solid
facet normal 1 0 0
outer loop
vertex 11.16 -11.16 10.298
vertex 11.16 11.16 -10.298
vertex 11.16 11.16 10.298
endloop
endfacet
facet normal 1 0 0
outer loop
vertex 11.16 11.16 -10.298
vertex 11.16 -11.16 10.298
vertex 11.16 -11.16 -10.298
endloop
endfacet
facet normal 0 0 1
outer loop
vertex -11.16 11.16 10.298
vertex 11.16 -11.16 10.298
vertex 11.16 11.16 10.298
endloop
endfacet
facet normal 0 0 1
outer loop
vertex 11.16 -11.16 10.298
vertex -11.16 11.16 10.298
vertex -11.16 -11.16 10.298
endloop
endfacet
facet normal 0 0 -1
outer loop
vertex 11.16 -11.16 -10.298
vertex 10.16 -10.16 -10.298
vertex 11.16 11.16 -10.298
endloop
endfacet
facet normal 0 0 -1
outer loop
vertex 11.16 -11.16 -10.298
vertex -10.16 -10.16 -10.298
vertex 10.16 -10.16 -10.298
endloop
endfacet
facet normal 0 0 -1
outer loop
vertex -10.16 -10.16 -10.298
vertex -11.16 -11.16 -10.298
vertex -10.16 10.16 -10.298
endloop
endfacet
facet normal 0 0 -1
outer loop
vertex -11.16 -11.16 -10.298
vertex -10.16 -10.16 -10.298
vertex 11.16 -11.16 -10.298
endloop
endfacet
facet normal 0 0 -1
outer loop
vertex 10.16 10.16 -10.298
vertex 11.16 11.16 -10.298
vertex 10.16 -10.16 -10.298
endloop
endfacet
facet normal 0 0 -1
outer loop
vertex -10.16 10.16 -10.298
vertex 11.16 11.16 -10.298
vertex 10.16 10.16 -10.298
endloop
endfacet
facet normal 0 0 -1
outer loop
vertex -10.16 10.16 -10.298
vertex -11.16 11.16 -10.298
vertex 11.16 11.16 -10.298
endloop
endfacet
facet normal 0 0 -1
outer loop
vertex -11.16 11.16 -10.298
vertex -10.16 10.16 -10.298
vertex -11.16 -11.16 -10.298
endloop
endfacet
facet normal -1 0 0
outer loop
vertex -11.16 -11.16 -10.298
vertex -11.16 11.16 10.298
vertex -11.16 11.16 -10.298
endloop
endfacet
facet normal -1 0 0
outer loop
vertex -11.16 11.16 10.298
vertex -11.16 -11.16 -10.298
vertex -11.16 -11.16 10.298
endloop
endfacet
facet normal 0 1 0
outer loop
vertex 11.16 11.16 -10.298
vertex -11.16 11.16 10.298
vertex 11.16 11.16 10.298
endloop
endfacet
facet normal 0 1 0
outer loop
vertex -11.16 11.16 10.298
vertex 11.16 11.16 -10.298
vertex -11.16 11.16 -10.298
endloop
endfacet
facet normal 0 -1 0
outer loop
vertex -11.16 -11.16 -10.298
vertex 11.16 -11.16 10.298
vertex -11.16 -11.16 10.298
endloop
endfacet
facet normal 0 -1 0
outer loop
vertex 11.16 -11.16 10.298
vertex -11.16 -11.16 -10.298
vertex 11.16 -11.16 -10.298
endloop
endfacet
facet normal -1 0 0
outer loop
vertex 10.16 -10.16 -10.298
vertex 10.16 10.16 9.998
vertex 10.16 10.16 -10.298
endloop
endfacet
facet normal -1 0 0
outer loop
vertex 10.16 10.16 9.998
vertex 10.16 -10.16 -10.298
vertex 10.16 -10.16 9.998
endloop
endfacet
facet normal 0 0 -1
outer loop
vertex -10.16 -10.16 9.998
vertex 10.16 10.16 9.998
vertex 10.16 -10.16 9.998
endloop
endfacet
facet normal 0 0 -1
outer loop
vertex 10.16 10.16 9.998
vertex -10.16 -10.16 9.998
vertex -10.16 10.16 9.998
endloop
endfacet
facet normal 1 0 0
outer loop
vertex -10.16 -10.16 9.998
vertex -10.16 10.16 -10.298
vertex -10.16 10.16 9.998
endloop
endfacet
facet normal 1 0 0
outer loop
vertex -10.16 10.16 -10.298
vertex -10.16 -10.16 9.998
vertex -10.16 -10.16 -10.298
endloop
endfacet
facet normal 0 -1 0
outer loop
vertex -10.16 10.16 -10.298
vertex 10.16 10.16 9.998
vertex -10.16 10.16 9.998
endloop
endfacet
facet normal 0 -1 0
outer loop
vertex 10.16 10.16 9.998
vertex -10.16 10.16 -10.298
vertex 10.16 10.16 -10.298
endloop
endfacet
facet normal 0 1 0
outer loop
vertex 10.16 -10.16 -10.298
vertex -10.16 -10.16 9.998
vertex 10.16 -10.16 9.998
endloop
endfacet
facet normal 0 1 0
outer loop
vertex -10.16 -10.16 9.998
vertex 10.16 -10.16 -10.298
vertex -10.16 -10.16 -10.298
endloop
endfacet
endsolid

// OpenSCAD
led_distance = 8 * 2.54;
wall_thickness = 1;
roof_thickness= 0.3;

direction = -1; // albo -1
led_half_angle = 60;
led_height = 12;
spot_radius = led_distance/2 * sqrt(2);
wall_height = led_height + spot_radius /tan(led_half_angle); 


inside_height = wall_height;
total_height = roof_thickness + wall_height;
inside_width = led_distance;
total_width = inside_width + wall_thickness * 2;

difference()
{
    cube( [total_width, total_width,  total_height], center=true);

    translate( [0, 0, abs(direction)/direction * roof_thickness] )
    {
        color( "red" )
        {
        cube( [inside_width, inside_width, total_height], center=true);
        }
    }
}
